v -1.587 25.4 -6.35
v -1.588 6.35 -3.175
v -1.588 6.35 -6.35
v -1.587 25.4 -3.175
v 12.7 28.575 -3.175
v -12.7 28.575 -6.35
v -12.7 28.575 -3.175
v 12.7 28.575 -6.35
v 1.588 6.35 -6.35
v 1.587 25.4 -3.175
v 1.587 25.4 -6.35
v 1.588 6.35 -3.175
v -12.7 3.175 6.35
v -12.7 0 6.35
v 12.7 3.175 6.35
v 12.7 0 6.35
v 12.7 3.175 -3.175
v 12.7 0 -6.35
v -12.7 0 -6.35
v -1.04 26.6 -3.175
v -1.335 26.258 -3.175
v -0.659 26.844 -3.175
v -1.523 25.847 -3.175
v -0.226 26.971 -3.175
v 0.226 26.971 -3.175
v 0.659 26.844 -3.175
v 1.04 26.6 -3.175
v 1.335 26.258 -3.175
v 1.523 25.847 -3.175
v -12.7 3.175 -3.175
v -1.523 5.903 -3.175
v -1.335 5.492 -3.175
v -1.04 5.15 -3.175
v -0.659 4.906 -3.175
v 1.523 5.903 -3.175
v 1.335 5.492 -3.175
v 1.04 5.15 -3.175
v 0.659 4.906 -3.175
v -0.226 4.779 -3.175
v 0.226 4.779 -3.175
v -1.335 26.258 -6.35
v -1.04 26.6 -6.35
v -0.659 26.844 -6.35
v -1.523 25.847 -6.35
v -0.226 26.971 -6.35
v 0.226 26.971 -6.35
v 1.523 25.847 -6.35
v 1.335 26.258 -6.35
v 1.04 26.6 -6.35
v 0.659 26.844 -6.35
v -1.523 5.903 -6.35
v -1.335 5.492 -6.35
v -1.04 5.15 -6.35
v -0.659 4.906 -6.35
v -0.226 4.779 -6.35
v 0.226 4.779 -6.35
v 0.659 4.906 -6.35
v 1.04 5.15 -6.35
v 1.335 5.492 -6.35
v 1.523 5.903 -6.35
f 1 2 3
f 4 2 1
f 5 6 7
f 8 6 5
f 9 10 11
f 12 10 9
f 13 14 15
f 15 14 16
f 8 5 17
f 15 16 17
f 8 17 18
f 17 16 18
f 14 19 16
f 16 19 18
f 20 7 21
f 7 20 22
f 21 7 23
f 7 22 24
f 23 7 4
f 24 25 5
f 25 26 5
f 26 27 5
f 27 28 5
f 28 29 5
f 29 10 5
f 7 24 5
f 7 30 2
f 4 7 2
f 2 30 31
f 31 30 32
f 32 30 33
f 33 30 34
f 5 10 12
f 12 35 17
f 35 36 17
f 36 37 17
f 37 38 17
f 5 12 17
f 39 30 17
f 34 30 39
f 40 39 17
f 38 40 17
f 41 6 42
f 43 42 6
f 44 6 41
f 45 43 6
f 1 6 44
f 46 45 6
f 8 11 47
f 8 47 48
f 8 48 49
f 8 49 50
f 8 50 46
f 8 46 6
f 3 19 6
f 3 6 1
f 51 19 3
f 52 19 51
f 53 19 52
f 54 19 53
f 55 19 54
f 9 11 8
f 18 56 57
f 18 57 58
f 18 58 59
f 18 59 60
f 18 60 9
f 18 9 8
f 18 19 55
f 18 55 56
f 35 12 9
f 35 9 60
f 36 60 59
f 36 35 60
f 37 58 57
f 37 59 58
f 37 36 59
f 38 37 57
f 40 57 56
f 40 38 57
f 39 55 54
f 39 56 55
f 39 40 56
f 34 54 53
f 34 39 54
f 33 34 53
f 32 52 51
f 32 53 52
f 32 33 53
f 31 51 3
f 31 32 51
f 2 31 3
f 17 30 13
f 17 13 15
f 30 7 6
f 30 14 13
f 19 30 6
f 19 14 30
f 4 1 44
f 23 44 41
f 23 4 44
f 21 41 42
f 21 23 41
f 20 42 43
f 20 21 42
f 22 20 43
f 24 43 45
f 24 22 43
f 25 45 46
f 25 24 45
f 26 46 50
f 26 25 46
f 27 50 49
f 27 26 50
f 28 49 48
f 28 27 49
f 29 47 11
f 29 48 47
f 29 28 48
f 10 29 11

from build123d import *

# Parameters (mm, degrees)
SKETCH1_W           = 25.4
SKETCH1_H           = 12.7
BOSS_EXTRUDE1_DEPTH = 3.175
SKETCH2_W           = 25.4
SKETCH2_H           = 3.175
BOSS_EXTRUDE2_DEPTH = 25.4
CUT_EXTRUDE1_DEPTH  = 33.688625698


with BuildPart() as part:
    # Sketch1 → Boss-Extrude1 (new body)
    with BuildSketch(Plane(origin=(0, 0, 0), x_dir=(1, 0, 0), z_dir=(0, 1, 0))):
        Rectangle(SKETCH1_W, SKETCH1_H)
    extrude(amount=BOSS_EXTRUDE1_DEPTH)

    # Sketch2 → Boss-Extrude2 (add)
    with BuildSketch(Plane(origin=(0, 3.175, 0), x_dir=(1, 0, 0), z_dir=(0, 1, 0))):
        with Locations((0, 4.7625)):
            Rectangle(SKETCH2_W, SKETCH2_H)
    extrude(amount=BOSS_EXTRUDE2_DEPTH)

    # Sketch3 → Cut-Extrude1 (cut, through all)
    with BuildSketch(Plane.XY.offset(-3.175)):
        with BuildLine():
            Line((1.5875, 25.4), (1.5875, 6.35))
            ThreePointArc((1.5875, 6.35), (0, 4.7625), (-1.5875, 6.35))
            Line((-1.5875, 6.35), (-1.5875, 25.4))
            ThreePointArc((-1.5875, 25.4), (0, 26.9875), (1.5875, 25.4))
        make_face()
    extrude(amount=-CUT_EXTRUDE1_DEPTH, mode=Mode.SUBTRACT)


solid = part.part
